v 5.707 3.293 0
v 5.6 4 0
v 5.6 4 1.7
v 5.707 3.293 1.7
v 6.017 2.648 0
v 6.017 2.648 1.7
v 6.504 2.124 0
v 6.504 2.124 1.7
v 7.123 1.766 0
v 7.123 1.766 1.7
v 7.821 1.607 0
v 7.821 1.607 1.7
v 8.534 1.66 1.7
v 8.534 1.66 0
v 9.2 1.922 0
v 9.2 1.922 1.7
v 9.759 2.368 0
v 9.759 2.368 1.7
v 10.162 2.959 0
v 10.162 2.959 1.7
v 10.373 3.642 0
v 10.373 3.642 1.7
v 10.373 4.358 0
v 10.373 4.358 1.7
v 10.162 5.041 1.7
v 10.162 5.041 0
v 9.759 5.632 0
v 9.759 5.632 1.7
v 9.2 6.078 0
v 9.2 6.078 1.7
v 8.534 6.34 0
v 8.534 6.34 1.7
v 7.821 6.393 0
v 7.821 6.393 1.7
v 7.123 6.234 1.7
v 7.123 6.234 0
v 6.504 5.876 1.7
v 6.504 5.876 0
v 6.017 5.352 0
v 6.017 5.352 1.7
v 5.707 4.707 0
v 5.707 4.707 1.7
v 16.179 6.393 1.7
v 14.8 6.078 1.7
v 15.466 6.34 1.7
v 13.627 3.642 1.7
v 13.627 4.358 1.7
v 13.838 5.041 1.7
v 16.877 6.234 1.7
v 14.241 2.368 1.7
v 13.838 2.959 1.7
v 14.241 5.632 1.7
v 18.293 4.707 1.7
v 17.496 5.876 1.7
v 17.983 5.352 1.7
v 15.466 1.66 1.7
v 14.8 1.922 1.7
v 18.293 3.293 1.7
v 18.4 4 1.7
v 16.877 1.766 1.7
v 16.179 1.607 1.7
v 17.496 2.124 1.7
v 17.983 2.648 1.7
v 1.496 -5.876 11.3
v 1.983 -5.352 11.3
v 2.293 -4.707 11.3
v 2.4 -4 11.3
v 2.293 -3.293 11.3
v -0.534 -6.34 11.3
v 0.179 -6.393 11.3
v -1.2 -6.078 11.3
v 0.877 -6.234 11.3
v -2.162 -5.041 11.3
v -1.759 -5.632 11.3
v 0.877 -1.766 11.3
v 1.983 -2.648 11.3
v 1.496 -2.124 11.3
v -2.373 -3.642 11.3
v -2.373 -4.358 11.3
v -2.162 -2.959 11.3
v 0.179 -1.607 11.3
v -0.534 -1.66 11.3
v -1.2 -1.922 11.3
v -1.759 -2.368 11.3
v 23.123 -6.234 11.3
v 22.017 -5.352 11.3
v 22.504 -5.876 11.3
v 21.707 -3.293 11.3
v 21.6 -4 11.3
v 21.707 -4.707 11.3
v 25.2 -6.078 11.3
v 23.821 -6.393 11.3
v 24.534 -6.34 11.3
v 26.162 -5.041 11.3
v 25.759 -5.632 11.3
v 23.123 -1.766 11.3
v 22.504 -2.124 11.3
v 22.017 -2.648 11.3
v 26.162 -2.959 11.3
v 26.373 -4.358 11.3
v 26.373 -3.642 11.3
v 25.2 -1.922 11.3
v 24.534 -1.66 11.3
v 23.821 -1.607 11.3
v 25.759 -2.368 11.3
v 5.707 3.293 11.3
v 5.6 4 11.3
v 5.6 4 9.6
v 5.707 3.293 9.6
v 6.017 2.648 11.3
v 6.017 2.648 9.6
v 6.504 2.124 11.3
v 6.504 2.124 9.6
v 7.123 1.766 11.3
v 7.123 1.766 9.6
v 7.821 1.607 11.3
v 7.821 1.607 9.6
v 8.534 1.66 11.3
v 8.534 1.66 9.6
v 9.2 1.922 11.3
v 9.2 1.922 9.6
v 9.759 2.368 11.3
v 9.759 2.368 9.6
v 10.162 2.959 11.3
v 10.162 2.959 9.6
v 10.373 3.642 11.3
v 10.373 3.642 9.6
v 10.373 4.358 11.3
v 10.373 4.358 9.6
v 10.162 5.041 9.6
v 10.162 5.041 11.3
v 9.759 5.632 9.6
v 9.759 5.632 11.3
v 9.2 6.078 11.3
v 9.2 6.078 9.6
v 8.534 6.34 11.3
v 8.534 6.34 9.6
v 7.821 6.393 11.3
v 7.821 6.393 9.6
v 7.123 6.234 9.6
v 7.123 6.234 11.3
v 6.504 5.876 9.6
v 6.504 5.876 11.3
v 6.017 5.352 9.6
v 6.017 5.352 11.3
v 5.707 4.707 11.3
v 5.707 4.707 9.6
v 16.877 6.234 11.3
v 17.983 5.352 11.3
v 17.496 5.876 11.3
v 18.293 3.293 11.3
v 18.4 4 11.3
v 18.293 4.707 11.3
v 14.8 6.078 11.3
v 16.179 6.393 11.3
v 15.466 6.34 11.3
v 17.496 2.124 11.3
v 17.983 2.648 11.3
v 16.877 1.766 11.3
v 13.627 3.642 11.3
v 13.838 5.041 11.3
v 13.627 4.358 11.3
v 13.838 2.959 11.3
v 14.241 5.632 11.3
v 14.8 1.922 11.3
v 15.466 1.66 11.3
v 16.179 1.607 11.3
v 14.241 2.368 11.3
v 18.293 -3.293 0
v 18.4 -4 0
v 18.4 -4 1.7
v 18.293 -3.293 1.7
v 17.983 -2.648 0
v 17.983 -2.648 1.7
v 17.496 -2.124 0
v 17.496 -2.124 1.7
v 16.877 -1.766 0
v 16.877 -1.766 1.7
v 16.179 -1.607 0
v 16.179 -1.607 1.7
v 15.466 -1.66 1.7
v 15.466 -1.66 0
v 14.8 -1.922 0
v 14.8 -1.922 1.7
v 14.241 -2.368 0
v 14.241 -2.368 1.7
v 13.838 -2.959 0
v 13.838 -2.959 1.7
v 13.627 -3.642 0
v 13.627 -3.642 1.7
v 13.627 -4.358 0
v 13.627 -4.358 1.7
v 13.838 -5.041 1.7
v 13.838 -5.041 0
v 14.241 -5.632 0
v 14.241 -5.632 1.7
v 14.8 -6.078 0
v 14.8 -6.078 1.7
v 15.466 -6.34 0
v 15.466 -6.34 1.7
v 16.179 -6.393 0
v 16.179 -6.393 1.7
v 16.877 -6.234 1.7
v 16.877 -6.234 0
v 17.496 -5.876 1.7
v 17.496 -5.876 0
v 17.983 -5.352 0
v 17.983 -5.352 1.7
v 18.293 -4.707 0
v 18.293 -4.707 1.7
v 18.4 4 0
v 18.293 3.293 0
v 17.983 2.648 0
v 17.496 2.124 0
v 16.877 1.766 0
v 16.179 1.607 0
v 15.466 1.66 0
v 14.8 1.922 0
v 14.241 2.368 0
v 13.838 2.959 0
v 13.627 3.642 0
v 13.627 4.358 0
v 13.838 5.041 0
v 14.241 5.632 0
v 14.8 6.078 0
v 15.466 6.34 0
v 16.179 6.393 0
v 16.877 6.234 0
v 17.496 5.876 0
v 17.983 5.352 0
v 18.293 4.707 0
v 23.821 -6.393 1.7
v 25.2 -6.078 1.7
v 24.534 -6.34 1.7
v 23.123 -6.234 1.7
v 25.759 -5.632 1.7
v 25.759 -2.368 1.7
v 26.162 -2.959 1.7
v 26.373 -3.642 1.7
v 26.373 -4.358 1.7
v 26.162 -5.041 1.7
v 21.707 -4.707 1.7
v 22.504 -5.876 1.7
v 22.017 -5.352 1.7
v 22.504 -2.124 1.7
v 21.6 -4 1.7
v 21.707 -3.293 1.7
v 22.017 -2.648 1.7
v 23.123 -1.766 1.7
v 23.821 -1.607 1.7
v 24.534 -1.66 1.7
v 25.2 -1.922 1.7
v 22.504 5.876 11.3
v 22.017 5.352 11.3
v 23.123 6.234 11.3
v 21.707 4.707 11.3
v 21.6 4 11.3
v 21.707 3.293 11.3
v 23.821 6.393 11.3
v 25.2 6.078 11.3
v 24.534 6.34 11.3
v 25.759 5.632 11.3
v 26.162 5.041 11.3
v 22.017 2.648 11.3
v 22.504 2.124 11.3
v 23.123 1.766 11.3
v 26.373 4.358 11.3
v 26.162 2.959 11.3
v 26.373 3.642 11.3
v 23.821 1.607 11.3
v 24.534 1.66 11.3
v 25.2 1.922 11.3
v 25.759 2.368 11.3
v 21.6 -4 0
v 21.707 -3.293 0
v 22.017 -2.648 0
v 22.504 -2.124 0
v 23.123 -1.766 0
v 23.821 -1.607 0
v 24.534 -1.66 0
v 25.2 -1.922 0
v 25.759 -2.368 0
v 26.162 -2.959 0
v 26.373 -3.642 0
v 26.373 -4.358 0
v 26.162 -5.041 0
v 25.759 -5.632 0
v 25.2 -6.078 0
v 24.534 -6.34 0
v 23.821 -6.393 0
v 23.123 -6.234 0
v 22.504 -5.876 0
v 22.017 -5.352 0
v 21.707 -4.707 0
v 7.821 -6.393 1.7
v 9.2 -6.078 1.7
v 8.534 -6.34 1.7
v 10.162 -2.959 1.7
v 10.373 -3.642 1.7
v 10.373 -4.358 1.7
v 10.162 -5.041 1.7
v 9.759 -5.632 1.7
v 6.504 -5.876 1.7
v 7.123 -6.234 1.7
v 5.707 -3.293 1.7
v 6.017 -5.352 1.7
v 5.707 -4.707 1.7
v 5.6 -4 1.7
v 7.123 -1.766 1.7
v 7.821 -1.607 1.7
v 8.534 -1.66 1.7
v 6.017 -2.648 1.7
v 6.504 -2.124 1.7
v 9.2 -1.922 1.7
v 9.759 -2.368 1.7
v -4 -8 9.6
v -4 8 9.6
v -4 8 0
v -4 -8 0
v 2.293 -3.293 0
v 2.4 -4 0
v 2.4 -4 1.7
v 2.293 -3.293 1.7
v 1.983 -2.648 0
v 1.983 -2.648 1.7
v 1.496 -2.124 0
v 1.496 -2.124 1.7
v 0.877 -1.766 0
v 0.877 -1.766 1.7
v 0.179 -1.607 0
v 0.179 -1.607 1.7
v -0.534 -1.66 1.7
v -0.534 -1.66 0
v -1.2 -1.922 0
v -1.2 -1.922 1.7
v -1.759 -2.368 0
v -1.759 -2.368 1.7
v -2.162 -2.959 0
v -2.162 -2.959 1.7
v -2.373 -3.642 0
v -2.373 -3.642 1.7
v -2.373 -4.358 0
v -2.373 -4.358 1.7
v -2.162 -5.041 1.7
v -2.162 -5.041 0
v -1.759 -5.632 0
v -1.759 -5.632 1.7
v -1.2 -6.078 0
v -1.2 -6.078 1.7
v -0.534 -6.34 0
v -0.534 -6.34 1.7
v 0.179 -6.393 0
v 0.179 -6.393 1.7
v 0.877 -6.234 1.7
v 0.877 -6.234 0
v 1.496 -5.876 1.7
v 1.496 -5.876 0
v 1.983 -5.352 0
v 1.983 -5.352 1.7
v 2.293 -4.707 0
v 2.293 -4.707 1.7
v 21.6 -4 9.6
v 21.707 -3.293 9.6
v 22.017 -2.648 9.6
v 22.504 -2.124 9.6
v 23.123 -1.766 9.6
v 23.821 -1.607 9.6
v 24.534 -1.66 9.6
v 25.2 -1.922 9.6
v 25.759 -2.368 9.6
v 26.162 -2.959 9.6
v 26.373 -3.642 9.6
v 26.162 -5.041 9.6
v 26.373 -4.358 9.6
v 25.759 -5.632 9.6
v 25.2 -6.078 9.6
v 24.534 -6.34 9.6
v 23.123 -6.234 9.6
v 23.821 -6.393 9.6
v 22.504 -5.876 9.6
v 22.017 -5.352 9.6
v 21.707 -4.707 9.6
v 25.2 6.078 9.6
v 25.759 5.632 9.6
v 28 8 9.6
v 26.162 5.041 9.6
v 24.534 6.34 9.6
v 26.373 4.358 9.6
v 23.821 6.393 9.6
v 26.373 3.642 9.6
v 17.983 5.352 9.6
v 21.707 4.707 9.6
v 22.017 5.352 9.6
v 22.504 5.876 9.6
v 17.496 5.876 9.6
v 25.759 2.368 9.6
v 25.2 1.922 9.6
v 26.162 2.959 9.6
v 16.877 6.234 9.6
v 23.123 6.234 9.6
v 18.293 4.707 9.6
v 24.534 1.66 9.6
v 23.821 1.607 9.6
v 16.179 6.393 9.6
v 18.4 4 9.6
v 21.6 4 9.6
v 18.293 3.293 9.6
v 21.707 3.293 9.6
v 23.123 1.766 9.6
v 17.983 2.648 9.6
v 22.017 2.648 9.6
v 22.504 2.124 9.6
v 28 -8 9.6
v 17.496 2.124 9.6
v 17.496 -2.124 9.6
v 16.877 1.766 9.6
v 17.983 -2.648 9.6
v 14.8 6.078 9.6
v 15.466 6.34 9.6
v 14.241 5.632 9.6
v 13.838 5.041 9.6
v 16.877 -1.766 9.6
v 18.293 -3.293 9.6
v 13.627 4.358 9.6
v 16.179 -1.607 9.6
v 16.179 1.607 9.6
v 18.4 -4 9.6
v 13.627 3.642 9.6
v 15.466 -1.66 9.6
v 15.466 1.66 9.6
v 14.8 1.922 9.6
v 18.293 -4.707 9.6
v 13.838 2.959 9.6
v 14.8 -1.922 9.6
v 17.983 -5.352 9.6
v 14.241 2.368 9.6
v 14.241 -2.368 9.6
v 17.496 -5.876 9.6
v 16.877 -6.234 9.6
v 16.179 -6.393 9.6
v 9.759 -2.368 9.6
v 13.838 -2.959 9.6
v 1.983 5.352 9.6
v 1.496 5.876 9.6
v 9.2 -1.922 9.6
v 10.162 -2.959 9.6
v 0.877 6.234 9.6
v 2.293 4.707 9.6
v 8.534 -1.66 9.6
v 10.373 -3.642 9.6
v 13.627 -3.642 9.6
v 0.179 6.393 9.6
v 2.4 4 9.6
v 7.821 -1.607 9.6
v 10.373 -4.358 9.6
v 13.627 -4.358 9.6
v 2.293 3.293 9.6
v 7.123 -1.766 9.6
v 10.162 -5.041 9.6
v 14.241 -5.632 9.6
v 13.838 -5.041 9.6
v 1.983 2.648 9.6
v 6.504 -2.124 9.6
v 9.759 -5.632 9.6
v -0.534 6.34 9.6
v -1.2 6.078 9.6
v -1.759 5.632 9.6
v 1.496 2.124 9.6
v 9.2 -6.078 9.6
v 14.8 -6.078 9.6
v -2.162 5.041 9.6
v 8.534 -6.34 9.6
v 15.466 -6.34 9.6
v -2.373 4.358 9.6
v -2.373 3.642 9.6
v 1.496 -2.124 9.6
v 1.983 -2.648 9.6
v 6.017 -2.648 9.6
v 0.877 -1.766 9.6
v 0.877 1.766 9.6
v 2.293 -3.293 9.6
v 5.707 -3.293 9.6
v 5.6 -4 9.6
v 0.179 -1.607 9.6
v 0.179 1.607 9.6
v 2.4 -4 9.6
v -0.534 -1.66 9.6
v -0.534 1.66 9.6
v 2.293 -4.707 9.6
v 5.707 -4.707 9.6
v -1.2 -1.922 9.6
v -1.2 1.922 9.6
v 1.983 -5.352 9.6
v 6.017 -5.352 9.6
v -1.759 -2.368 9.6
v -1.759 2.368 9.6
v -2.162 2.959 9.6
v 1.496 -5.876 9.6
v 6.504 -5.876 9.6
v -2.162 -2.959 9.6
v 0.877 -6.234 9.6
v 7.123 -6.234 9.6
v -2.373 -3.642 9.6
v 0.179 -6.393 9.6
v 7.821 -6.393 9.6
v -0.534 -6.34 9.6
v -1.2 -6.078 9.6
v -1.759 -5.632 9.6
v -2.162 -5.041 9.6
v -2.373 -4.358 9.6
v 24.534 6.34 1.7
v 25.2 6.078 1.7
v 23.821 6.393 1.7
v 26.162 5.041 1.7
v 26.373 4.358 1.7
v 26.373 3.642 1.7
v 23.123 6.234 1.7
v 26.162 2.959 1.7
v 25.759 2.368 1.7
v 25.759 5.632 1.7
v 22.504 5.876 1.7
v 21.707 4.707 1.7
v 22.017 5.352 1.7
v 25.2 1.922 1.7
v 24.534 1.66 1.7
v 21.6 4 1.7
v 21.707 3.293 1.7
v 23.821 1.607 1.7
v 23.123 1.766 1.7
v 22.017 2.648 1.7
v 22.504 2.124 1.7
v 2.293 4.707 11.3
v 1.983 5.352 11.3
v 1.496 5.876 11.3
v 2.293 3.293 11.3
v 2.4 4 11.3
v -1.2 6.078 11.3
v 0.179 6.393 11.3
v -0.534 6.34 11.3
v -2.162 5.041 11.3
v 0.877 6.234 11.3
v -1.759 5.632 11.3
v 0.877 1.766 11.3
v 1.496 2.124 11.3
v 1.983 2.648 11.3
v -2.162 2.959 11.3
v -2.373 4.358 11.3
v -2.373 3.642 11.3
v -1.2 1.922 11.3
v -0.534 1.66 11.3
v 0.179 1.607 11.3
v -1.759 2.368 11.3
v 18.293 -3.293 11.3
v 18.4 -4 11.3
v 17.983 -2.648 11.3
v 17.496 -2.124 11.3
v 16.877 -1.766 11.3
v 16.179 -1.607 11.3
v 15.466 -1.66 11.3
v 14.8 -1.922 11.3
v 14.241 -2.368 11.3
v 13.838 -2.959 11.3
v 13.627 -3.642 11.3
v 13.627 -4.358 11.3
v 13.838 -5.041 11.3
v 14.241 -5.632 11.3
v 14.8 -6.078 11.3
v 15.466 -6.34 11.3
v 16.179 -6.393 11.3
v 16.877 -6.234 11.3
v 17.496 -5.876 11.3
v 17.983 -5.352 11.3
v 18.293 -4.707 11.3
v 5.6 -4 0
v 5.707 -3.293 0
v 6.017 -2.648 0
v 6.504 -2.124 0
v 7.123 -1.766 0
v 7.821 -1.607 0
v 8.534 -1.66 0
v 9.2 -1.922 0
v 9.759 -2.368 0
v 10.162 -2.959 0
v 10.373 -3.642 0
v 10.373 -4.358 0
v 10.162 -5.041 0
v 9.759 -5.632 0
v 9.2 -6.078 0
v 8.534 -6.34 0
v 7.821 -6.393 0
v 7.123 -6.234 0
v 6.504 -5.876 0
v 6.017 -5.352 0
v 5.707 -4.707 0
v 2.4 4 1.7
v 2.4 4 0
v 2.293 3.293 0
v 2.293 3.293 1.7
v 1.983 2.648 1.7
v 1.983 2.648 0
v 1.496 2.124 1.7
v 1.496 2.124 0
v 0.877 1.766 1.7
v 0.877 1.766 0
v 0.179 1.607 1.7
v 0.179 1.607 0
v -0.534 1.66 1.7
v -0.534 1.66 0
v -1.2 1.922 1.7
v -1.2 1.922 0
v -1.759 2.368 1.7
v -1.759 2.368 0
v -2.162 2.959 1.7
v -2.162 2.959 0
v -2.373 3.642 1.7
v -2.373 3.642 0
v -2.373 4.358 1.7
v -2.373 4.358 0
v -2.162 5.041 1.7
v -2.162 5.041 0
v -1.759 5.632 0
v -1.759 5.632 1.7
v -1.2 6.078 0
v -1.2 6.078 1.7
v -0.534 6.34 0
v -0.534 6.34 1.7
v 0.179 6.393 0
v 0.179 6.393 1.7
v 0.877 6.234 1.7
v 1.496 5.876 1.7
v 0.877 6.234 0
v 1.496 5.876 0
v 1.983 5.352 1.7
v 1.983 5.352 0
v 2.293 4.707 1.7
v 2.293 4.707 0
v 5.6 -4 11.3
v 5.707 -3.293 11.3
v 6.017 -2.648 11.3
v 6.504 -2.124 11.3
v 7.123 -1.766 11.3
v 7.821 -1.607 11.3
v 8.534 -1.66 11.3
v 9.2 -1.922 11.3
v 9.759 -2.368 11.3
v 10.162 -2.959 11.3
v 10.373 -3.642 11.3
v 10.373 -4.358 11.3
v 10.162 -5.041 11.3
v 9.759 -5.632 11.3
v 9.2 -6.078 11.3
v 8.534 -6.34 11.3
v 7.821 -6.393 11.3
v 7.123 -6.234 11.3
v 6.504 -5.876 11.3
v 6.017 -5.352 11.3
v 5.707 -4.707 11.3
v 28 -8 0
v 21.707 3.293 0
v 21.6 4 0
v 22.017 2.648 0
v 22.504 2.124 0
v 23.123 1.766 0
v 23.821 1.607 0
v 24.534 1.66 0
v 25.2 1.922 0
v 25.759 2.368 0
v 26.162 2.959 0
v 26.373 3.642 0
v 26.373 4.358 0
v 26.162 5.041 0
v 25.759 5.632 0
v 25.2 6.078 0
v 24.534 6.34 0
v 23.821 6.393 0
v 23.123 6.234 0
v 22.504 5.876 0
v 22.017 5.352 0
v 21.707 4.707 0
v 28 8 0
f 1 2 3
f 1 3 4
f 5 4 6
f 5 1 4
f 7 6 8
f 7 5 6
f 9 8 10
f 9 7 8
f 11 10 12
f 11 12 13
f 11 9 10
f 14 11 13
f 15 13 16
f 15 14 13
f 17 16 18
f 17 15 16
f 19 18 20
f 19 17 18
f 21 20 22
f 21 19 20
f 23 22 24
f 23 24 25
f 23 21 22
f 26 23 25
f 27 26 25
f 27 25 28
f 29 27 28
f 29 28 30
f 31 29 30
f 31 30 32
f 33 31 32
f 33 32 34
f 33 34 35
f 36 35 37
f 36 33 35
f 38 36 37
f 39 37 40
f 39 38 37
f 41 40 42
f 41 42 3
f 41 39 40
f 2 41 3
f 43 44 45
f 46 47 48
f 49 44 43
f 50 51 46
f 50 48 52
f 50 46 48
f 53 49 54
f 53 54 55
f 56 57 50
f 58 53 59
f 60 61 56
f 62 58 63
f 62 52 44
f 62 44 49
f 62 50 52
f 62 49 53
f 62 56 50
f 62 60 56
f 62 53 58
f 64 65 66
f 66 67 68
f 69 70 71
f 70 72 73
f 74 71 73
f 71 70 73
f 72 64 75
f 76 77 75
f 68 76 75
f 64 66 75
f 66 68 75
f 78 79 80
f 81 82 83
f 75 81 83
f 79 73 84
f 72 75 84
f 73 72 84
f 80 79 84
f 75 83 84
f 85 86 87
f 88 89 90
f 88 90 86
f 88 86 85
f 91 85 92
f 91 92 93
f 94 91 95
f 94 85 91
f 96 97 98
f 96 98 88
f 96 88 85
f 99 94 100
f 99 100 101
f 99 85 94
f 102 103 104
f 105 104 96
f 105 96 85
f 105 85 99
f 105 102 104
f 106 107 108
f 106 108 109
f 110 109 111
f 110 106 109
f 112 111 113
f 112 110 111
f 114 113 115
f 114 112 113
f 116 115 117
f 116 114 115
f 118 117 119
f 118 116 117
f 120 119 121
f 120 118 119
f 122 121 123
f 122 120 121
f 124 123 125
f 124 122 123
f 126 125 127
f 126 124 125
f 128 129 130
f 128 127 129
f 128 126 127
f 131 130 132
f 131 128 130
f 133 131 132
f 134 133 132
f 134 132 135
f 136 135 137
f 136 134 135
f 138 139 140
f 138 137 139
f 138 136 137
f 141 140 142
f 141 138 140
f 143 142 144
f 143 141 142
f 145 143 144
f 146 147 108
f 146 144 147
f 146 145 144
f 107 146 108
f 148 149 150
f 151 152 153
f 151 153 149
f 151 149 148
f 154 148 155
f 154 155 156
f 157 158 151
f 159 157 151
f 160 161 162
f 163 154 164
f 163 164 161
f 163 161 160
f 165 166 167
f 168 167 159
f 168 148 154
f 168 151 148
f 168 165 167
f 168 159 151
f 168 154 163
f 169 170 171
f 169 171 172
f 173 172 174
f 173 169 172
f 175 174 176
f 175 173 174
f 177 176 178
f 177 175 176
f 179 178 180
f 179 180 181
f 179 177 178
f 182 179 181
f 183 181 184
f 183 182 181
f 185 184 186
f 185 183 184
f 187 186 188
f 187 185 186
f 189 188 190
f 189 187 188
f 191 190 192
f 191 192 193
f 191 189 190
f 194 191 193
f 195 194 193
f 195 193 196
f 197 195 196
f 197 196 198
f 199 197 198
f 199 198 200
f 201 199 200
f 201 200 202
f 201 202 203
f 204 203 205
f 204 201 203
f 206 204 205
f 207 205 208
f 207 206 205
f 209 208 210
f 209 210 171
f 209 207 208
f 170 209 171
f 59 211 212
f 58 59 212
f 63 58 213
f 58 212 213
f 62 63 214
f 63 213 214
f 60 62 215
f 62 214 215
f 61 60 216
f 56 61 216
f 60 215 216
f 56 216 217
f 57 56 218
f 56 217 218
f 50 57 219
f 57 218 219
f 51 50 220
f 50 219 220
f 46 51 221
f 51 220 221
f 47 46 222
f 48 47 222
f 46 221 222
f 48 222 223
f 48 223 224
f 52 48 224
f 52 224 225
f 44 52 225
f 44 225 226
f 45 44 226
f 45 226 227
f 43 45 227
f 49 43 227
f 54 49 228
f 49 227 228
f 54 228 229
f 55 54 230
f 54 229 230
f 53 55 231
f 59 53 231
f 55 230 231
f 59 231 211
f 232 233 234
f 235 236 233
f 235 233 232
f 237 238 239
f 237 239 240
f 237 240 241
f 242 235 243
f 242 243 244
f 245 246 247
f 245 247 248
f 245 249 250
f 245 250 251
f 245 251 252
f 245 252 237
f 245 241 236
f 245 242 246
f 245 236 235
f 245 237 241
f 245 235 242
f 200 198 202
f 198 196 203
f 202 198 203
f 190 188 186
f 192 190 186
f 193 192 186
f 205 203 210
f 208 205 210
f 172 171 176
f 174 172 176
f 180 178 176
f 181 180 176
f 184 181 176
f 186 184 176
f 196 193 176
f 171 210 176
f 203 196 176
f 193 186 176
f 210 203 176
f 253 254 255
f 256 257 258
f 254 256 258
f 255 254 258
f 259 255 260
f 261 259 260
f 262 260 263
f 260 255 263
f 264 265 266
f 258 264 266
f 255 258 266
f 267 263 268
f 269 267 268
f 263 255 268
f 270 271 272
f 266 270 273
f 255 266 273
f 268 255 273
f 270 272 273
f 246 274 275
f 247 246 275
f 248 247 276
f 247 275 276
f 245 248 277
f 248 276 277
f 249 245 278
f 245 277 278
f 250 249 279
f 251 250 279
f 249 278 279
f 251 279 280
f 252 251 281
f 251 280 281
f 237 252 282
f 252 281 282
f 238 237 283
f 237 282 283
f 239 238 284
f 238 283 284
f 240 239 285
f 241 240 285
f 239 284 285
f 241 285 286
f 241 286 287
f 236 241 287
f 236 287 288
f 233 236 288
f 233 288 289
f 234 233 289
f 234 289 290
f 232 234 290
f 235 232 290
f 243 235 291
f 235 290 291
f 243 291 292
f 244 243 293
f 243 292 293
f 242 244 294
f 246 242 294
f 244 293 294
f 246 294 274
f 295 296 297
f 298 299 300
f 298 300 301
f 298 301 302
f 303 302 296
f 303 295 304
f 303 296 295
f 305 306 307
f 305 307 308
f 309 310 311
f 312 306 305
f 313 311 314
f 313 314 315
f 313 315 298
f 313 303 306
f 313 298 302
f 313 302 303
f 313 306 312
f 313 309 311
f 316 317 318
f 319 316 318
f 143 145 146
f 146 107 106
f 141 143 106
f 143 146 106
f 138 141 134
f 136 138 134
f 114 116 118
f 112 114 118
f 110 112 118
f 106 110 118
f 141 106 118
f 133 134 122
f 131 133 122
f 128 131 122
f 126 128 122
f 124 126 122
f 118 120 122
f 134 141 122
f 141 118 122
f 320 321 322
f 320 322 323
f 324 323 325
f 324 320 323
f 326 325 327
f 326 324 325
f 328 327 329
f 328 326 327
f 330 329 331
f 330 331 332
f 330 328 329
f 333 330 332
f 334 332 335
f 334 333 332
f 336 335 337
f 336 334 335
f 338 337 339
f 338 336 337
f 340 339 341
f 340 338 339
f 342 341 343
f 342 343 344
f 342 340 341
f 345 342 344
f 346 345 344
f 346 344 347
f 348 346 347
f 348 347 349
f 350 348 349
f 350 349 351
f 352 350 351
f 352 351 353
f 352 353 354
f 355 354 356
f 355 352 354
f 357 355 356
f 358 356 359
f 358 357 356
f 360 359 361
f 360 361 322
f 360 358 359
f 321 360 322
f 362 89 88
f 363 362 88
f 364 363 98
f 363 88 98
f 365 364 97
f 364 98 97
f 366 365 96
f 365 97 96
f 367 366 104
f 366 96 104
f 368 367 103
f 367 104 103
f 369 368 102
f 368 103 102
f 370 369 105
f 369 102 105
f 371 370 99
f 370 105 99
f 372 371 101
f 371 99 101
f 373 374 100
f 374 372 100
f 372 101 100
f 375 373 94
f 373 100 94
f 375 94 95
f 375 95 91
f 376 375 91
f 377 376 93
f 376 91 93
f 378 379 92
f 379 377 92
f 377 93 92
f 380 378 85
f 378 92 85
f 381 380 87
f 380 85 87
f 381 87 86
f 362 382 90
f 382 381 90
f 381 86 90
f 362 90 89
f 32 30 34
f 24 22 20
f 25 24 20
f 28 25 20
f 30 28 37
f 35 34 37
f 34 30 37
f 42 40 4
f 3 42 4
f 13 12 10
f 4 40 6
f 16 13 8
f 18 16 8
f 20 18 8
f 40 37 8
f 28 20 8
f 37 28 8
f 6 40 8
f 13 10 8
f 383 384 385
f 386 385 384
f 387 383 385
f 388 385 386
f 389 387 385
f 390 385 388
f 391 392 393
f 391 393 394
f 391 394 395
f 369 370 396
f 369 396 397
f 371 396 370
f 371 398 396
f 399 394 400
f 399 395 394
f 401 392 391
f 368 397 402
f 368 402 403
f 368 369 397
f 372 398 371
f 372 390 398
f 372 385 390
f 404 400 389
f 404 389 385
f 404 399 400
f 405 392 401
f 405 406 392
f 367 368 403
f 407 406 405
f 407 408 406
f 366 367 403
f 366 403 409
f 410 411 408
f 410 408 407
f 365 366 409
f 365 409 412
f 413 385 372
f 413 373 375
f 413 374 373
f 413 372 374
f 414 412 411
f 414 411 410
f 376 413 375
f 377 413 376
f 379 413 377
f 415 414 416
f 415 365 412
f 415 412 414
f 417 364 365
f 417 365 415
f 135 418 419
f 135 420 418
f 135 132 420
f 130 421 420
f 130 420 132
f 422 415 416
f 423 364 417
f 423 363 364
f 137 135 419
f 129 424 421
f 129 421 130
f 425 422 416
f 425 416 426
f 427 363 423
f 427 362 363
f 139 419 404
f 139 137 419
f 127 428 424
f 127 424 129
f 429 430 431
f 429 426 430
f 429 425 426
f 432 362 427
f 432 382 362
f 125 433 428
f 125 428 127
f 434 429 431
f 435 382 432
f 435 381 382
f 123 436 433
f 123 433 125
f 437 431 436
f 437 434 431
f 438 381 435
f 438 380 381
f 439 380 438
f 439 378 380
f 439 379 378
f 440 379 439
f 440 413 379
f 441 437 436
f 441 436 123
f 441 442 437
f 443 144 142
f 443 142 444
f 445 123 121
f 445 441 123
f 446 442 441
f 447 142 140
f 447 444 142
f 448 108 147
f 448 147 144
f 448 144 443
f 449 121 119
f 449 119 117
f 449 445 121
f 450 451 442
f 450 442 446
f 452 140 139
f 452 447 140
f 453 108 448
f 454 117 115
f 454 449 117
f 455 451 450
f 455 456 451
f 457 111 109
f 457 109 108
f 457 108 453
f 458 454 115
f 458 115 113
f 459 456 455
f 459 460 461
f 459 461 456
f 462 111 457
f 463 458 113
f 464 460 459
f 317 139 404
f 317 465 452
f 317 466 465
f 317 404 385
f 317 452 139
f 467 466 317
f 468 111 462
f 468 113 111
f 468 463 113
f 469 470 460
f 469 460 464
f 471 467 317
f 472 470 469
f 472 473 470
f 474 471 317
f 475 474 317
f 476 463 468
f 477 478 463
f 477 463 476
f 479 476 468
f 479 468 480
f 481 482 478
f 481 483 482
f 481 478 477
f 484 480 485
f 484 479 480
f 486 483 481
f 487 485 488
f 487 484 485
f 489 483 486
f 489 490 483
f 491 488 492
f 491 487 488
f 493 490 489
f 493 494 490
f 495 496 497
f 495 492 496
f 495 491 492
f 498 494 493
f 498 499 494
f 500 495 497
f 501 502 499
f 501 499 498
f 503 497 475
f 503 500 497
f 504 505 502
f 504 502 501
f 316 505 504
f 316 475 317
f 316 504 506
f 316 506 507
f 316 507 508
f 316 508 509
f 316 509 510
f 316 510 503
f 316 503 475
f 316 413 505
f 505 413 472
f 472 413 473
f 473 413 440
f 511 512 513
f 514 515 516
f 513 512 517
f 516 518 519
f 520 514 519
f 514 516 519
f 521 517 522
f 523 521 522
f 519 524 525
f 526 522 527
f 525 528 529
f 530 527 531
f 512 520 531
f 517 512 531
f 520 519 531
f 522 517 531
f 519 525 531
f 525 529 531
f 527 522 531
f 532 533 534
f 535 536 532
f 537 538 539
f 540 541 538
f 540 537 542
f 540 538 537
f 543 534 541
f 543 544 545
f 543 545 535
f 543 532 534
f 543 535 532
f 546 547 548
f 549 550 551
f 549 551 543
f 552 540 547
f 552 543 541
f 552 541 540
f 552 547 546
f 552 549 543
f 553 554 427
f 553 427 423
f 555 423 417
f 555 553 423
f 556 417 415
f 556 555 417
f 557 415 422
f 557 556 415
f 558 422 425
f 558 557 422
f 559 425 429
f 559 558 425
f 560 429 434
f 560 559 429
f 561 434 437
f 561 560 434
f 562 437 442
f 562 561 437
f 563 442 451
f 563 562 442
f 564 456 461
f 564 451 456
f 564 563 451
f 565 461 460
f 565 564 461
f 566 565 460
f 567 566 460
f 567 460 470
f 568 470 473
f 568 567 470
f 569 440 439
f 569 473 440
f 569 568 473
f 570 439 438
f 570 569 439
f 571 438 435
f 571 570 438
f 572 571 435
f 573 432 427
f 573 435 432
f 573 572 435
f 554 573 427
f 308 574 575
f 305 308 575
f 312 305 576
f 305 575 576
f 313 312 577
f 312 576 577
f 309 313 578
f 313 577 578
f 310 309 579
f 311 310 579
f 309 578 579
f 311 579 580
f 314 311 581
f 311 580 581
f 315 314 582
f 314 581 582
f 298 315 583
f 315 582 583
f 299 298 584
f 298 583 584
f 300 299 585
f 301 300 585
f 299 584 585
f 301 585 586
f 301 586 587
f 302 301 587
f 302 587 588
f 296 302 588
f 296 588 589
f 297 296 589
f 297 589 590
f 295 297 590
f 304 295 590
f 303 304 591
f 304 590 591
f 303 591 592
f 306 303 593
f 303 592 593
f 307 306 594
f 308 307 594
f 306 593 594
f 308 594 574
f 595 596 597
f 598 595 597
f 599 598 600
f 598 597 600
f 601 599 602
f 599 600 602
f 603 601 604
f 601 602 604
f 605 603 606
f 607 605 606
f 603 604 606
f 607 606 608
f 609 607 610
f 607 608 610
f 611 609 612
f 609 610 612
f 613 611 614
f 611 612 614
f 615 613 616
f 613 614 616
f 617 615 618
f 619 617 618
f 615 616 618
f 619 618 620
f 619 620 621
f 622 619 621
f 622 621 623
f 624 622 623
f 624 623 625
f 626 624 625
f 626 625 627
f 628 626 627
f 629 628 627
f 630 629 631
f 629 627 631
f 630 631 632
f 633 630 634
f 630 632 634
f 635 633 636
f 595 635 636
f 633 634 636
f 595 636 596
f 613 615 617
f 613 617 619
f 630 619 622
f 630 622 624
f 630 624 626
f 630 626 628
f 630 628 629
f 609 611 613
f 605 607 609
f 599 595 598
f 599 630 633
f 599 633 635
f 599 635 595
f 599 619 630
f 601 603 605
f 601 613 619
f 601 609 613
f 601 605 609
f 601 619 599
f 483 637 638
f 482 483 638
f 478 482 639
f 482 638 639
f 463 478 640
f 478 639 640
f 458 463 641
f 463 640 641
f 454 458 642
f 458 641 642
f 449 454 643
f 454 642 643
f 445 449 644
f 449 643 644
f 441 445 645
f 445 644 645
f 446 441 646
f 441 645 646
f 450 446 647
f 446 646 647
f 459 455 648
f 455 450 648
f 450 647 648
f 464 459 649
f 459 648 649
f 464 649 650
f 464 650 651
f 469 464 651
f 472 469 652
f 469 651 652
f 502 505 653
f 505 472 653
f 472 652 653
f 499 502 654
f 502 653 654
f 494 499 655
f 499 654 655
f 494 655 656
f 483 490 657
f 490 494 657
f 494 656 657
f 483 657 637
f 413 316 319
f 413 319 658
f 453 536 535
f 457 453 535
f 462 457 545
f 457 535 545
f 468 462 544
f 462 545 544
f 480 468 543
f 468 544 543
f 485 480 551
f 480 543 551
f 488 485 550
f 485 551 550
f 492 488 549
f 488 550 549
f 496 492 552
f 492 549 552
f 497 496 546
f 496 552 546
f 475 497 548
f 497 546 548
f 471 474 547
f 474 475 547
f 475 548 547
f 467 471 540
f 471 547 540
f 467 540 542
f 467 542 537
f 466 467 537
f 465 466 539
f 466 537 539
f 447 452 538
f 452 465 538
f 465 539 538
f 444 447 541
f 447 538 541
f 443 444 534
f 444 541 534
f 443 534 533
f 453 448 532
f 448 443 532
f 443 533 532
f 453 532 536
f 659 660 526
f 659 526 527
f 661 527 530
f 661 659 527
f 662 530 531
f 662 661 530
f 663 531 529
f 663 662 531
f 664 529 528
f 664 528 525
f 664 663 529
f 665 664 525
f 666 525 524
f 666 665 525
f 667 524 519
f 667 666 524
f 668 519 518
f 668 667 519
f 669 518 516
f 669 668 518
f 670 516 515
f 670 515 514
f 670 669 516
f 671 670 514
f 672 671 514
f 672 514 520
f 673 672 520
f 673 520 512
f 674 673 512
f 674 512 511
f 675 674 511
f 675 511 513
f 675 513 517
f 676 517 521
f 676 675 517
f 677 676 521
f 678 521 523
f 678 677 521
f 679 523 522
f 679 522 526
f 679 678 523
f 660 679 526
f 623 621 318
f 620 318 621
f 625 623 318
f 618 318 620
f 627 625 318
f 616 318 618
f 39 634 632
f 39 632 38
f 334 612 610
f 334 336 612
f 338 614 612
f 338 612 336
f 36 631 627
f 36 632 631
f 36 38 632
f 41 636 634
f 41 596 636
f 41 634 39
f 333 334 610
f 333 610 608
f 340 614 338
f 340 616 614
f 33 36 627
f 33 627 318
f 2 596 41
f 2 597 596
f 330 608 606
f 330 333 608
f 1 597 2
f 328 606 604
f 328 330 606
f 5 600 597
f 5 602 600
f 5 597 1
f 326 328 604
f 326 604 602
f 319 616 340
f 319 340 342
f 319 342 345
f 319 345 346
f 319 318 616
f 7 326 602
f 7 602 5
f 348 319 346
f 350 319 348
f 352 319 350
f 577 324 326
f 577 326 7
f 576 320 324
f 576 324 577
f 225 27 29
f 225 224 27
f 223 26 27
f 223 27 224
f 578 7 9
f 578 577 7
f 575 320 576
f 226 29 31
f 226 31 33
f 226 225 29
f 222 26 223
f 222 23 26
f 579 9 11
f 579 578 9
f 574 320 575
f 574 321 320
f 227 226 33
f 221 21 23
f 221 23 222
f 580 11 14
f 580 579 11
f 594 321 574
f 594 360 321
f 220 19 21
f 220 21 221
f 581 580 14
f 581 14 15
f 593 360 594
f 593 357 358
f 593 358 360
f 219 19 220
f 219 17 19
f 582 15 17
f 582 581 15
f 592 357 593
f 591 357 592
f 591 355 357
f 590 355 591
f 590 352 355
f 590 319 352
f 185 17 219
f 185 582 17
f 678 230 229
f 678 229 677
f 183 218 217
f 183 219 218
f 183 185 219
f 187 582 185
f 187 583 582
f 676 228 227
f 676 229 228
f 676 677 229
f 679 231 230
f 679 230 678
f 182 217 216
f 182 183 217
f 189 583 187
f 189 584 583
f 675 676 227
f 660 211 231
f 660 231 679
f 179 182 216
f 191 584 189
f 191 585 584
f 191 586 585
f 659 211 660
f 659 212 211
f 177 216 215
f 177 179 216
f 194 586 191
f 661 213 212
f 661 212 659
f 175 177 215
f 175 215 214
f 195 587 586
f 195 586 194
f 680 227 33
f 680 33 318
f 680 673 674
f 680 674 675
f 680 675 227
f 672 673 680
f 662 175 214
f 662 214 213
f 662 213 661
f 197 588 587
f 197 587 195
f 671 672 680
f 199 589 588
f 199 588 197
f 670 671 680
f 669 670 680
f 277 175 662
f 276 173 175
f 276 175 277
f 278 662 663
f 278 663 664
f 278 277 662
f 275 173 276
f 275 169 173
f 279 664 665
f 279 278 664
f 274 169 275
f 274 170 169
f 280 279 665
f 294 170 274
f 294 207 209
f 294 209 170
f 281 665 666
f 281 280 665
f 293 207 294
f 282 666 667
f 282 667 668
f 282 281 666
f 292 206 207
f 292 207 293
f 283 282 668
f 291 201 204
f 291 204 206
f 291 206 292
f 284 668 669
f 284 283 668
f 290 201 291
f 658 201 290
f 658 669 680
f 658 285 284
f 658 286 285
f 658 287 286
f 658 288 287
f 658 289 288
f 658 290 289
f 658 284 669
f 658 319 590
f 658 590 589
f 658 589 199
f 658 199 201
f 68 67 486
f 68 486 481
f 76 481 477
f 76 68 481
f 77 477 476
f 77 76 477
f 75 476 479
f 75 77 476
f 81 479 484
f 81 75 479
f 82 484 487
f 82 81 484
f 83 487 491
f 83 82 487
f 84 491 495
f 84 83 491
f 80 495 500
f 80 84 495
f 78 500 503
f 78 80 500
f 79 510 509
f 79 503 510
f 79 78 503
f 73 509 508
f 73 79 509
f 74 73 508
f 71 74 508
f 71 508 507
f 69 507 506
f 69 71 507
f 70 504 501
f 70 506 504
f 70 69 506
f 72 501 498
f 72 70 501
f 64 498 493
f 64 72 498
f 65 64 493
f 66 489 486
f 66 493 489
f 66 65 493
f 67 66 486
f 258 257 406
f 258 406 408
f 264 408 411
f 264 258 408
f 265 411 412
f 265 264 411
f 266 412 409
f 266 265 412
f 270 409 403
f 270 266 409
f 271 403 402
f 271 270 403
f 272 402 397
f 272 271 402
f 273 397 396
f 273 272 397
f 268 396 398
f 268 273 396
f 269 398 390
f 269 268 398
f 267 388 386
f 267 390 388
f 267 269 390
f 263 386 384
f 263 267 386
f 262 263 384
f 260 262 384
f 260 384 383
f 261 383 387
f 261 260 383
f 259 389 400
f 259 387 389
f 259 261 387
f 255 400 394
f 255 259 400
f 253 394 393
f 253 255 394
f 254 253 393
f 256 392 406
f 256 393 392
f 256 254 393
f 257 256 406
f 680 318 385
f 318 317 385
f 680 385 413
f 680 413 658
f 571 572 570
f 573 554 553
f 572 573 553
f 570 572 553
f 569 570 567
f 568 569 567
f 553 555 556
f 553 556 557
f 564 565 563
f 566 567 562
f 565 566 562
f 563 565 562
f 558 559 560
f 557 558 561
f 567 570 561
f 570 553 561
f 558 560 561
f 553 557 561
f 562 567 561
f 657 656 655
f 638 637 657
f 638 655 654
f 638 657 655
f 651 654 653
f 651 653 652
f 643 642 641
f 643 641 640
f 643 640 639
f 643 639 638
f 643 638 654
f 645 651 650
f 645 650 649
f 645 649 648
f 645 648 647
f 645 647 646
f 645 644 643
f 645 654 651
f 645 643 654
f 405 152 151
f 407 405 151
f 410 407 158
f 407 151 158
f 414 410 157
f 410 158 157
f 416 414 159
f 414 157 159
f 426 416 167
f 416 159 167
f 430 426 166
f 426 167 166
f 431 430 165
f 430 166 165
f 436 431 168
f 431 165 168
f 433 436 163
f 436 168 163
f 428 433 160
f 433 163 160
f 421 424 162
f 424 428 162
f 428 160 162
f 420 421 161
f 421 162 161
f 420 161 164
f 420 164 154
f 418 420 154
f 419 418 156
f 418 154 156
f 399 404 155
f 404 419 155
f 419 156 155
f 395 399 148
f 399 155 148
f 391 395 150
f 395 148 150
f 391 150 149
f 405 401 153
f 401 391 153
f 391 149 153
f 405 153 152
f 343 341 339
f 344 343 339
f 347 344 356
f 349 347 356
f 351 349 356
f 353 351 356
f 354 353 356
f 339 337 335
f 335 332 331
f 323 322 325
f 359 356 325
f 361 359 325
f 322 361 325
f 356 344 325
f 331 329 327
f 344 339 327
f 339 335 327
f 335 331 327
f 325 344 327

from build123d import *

# Parameters (mm, degrees)
F1_DEPTH = 8
F3_W     = 8
F3_H     = 8
F3_R     = 2.4
F4_DEPTH = 1.7
F5_R     = 2.4
F6_DEPTH = 1.7


with BuildPart() as f1:
    # F0 (on Front) → F1 (new body)
    with BuildSketch(Plane.XZ):
        Polygon((-2.4, 9.6), (-4, 9.6), (-4, 0), (4, 0), (4, 9.6), (2.4, 9.6), (2.4, 11.3), (-2.4, 11.3), align=None)
    extrude(amount=F1_DEPTH)

    # F3 (on plane+point) → F4 (cut, through all)
    with BuildSketch(Plane.XY.offset(11.3)):
        with Locations((0, -4)):
            Rectangle(F3_W, F3_H)
        with Locations((0, -4)):
            Circle(F3_R, mode=Mode.SUBTRACT)
    extrude(amount=-F4_DEPTH, mode=Mode.SUBTRACT)

    # F5 (on Top) → F6 (cut)
    with BuildSketch(Plane.XY):
        with Locations((0, -4)):
            Circle(F5_R)
    extrude(amount=F6_DEPTH, mode=Mode.SUBTRACT)

    # F8: F1 across plane


with BuildPart() as f1_1:
    add(f1.part)
    add(f1.part.mirror(Plane.YZ.offset(4)))

    # F9: F1 across plane


with BuildPart() as f1_2:
    add(f1_1.part)
    add(f1_1.part.mirror(Plane.XZ))

    # F11: F1 across plane


with BuildPart() as f1_3:
    add(f1_2.part)
    add(f1_2.part.mirror(Plane.YZ.offset(12)))


solid = f1_3.part
